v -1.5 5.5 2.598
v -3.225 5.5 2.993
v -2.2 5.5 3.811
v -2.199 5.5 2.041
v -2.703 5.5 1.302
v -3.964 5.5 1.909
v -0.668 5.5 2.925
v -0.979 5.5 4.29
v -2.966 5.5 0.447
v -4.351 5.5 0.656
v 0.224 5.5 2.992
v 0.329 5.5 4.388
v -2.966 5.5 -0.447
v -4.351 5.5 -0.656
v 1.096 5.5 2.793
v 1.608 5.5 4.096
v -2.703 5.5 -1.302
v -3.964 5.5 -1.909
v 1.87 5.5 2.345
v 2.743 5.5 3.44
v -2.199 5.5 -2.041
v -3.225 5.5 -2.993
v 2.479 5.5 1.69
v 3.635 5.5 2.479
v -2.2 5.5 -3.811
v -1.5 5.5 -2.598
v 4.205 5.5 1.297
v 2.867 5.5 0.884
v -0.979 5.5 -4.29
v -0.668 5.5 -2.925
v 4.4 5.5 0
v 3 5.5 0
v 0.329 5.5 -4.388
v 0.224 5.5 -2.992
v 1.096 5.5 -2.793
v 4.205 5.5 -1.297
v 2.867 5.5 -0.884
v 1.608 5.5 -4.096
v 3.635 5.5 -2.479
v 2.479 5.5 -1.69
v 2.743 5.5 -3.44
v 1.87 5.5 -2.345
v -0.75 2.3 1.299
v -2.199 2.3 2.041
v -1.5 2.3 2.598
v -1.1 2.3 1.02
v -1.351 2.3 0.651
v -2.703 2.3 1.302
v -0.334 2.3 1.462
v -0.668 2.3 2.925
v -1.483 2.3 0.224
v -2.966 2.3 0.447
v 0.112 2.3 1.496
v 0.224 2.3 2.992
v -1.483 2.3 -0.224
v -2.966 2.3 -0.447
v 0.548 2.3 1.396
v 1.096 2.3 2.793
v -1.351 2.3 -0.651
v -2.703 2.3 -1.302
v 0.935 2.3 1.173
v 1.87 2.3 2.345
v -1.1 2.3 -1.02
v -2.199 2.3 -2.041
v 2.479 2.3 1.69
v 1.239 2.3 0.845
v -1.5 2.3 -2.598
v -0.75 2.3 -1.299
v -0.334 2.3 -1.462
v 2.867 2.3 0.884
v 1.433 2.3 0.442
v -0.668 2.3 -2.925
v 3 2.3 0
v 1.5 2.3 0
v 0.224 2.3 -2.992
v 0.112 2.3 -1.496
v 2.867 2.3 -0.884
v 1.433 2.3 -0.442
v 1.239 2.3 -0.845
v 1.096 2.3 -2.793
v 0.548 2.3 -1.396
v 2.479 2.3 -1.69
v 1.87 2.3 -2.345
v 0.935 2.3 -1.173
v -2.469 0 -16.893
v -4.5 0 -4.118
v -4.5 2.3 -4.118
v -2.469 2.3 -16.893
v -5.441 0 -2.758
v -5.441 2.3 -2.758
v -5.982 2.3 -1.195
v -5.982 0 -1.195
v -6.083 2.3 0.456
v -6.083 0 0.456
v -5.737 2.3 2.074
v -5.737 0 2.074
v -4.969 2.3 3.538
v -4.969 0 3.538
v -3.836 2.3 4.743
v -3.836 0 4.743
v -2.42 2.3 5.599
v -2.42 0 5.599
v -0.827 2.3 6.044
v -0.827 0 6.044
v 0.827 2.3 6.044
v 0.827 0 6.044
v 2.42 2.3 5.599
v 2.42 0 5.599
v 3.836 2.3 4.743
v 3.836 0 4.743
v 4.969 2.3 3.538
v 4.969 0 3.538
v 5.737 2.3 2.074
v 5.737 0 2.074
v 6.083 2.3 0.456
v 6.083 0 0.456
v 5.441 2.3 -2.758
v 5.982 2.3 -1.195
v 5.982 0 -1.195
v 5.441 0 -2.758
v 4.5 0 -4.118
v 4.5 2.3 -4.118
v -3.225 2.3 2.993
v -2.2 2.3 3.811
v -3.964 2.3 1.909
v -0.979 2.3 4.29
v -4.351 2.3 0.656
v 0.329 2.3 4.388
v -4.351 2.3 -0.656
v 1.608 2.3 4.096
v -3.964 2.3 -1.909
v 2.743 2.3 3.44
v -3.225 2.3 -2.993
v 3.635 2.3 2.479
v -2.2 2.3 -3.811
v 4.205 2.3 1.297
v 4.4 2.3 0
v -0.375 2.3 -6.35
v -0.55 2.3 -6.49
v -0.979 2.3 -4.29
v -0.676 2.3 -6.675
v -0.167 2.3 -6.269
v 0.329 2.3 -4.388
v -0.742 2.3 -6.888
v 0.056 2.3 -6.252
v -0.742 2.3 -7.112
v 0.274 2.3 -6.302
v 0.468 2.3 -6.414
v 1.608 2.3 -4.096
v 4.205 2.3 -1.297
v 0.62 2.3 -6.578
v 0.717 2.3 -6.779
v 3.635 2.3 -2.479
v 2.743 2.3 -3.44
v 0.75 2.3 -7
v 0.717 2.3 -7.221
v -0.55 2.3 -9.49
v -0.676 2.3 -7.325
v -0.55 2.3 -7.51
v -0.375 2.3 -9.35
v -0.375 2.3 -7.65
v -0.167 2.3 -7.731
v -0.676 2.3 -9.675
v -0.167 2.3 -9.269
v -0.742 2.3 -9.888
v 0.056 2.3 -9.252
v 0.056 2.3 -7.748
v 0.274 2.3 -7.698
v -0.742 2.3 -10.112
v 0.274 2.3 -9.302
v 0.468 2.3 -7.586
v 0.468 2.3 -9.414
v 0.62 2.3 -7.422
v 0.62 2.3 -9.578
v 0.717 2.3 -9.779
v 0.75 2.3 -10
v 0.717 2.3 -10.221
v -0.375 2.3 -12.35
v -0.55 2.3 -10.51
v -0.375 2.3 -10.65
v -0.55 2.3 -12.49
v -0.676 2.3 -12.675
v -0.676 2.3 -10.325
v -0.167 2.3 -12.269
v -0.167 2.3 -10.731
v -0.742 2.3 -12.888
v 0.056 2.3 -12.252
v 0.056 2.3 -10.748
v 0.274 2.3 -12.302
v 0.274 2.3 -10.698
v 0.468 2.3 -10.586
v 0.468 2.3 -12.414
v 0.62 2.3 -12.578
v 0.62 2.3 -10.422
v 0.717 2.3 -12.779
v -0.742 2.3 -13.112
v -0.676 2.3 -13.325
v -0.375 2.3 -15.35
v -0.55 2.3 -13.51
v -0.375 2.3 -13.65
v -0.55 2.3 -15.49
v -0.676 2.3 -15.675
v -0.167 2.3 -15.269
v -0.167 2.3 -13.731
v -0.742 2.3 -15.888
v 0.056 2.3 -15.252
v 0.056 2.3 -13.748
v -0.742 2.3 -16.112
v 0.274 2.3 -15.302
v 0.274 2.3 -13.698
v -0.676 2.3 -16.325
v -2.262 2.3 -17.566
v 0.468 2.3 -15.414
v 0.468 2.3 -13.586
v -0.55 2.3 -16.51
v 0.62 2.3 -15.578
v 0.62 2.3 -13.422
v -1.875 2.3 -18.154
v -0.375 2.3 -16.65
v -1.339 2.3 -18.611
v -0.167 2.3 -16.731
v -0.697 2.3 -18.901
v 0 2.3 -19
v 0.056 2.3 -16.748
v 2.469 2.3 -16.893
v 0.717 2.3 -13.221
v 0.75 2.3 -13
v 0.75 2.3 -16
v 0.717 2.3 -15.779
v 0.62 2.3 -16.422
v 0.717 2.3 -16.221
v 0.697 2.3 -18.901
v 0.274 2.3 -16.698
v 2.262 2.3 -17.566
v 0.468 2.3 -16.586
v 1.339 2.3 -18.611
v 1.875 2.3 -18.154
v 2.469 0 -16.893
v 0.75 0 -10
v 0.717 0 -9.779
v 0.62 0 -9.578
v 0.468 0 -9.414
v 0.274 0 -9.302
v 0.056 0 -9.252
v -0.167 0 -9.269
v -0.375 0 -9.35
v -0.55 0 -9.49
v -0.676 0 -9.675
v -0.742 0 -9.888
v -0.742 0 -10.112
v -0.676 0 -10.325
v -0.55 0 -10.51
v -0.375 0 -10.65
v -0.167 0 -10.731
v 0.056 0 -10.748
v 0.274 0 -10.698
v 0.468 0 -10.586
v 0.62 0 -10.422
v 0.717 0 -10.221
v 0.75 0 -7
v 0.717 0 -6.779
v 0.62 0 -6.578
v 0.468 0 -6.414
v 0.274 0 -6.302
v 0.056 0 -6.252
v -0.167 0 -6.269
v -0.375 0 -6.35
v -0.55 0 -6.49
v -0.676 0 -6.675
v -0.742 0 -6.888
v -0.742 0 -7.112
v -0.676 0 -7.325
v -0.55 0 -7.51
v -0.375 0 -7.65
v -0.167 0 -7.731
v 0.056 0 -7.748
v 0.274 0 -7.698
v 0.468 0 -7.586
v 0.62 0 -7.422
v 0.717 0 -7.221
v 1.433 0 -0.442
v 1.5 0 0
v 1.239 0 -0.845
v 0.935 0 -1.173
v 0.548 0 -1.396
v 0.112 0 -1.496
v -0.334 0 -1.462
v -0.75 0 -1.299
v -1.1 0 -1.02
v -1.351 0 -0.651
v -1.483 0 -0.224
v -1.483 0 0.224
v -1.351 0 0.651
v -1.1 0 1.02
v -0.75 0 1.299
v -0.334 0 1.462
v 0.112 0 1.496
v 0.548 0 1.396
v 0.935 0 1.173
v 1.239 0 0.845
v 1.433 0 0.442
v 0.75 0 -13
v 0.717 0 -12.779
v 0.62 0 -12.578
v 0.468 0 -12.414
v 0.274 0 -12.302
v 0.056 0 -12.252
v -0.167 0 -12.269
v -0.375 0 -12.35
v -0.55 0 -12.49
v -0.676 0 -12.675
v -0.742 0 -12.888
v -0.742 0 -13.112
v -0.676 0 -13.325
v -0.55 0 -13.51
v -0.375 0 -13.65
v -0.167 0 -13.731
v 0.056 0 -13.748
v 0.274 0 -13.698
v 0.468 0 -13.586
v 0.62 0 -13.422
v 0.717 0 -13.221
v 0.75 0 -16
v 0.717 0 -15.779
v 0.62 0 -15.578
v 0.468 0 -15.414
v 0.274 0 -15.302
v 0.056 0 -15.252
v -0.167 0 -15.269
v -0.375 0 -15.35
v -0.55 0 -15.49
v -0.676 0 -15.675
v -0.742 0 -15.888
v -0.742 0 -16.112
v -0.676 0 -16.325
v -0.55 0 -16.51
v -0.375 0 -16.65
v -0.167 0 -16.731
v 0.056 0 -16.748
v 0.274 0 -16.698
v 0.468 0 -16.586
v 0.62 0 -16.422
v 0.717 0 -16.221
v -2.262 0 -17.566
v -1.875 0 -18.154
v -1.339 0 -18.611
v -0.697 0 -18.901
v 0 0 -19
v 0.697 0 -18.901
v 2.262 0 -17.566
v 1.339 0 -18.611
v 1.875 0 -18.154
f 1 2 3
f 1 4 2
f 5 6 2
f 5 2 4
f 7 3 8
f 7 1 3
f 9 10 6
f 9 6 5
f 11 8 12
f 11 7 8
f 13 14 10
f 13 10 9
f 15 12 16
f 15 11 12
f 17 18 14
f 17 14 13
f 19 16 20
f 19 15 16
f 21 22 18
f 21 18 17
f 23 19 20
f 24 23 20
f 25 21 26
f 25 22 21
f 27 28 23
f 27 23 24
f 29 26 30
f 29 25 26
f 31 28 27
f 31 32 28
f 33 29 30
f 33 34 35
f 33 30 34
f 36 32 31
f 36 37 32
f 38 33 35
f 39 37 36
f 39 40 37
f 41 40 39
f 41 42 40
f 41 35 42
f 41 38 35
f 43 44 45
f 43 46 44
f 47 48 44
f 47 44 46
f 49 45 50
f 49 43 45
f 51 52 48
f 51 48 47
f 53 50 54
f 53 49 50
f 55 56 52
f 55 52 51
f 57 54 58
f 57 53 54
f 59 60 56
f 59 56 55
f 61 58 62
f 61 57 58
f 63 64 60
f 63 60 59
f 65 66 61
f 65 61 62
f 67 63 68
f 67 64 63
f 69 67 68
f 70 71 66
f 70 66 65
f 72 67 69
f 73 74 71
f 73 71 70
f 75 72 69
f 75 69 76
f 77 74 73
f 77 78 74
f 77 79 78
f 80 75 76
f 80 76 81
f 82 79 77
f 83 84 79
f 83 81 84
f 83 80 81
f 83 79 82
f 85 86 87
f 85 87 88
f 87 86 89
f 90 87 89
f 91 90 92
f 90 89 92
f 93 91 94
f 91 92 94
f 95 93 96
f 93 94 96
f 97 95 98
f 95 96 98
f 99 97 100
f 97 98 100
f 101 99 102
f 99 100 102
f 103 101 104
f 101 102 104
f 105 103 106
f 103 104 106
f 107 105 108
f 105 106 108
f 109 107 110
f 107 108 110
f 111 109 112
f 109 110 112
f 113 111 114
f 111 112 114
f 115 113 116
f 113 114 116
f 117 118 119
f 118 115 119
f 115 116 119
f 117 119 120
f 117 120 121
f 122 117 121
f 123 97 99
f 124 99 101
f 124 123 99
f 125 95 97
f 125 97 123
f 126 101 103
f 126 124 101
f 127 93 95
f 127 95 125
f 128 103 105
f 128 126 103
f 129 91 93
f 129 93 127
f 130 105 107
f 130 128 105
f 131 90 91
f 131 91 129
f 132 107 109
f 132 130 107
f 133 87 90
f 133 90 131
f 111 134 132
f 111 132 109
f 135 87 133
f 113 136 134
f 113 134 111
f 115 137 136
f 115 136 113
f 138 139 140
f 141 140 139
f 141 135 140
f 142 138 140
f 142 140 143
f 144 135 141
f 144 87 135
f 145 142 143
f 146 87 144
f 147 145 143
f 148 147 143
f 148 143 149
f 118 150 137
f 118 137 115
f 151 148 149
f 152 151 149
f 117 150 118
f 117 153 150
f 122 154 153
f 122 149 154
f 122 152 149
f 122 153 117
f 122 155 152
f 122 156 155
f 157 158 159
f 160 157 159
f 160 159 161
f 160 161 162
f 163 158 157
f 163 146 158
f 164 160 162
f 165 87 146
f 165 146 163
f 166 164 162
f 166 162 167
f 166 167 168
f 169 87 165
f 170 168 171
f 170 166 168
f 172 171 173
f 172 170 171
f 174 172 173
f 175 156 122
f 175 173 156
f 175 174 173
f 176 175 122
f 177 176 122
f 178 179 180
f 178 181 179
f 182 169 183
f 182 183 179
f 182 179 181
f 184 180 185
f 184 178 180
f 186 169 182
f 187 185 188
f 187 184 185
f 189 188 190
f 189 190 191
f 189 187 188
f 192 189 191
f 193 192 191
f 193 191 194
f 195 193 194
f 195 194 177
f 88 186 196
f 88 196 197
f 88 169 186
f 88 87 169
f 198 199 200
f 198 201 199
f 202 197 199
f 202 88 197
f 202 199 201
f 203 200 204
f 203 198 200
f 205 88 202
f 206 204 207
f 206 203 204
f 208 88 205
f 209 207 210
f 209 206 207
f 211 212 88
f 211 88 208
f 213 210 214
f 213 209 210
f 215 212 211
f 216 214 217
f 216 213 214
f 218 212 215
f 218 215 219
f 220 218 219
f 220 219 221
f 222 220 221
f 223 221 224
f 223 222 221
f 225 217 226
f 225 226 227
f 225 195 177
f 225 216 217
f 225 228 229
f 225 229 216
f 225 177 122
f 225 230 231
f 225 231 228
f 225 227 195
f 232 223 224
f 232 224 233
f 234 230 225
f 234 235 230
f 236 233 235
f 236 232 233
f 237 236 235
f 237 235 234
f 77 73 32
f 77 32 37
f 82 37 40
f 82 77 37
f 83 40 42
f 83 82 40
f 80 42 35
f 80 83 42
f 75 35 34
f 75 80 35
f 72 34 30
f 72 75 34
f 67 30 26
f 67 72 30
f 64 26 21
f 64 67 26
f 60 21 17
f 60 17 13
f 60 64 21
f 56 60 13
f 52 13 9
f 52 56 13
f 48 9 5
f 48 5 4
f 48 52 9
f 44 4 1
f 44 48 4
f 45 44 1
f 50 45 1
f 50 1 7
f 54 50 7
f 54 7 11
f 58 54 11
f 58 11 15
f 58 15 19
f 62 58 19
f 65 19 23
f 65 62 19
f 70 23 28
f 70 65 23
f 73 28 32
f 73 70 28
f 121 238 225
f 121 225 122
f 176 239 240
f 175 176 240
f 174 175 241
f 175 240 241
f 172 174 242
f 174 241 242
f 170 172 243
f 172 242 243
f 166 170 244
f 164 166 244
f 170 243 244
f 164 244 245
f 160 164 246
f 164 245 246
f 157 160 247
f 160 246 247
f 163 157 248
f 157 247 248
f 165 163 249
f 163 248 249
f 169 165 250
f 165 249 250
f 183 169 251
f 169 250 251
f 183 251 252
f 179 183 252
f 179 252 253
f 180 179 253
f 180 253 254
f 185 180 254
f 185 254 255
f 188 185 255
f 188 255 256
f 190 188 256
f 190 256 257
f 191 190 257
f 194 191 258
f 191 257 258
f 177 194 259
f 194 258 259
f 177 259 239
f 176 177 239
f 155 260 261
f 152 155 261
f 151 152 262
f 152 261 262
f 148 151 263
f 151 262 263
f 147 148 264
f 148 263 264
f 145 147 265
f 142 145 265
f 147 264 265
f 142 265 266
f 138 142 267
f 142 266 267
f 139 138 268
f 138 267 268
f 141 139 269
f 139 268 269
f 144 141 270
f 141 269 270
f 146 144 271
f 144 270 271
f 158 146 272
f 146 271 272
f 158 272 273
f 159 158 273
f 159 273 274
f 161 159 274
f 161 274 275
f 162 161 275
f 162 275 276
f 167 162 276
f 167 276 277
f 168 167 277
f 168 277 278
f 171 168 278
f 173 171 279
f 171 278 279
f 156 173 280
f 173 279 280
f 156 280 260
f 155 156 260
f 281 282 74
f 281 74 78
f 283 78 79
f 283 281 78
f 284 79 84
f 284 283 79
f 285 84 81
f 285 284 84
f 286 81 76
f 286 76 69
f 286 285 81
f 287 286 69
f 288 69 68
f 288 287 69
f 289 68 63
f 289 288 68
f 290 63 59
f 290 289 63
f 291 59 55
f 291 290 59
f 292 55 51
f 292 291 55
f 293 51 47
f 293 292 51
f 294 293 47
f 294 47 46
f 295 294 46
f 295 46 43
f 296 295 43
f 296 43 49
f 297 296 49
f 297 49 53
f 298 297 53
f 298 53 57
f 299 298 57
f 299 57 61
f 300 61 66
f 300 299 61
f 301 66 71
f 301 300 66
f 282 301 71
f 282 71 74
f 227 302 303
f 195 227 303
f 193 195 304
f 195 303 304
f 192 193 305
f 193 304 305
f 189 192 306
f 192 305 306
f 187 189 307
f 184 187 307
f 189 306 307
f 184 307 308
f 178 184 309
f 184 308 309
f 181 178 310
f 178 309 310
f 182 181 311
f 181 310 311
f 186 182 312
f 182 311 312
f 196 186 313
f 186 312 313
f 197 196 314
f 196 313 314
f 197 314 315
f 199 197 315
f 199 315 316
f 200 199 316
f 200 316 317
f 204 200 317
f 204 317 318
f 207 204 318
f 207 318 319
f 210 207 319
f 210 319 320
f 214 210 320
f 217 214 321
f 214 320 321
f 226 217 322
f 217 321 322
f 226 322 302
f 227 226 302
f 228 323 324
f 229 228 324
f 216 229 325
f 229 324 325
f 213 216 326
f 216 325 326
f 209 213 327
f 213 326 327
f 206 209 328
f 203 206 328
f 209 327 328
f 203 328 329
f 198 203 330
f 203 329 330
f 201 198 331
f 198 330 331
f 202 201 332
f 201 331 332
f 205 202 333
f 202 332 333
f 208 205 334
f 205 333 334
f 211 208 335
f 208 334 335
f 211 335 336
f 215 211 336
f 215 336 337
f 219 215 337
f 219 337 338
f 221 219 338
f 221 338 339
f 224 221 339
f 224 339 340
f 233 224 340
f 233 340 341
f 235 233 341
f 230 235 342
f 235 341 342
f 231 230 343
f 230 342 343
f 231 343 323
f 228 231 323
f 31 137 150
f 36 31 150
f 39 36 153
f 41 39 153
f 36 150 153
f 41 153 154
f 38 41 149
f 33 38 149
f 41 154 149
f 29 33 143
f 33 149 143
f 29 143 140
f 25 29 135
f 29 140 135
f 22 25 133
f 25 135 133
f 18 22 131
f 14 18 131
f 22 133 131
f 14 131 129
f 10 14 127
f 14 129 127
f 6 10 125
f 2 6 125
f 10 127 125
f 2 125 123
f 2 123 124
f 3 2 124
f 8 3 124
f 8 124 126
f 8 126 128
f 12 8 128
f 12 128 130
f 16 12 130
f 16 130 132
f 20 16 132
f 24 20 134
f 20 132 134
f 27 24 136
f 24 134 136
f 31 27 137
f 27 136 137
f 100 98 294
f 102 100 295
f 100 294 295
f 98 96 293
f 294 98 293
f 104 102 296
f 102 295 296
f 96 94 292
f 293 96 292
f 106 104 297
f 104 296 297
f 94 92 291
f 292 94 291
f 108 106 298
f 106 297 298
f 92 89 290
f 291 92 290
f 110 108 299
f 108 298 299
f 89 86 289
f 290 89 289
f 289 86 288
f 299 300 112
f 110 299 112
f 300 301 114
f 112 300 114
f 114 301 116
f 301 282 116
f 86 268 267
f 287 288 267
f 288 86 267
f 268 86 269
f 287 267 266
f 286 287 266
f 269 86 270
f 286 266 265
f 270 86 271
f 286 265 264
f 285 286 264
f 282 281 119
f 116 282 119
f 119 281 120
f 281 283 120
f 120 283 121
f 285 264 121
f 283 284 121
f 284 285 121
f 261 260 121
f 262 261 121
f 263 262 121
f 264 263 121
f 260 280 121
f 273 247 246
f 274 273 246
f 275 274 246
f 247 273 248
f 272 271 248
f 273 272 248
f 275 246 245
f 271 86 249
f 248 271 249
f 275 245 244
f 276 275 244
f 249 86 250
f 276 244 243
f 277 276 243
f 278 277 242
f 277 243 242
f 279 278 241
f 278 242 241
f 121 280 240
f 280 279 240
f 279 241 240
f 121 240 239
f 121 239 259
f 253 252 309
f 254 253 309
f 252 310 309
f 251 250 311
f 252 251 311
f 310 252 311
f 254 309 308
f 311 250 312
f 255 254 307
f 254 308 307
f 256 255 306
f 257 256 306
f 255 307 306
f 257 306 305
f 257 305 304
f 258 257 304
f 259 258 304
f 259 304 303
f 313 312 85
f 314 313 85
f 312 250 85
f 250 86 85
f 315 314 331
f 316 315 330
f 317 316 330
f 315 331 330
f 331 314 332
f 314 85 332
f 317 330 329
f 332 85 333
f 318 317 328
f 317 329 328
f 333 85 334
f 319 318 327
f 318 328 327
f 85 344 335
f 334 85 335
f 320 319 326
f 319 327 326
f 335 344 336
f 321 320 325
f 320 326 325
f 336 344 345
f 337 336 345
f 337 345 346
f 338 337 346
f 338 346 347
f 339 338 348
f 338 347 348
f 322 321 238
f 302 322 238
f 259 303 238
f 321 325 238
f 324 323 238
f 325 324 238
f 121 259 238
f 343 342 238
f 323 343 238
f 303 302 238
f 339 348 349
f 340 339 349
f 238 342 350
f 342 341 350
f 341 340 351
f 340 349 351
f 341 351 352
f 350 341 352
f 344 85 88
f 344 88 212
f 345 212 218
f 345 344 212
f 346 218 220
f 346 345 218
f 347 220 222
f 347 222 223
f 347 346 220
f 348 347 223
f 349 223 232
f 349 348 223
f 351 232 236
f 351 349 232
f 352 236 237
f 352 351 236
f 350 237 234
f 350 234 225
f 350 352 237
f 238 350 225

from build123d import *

# Parameters (mm, degrees)
SKETCH1_R           = 6.1
SKETCH1_R_2         = 1.5
BOSS_EXTRUDE1_DEPTH = 2.3
SKETCH2_R           = 4.4
SKETCH2_R_2         = 3
BOSS_EXTRUDE2_DEPTH = 3.2
SKETCH3_R           = 0.75
BOSS_EXTRUDE3_DEPTH = 2.3


with BuildPart() as part:
    # Sketch1 → Boss-Extrude1 (new body)
    with BuildSketch(Plane(origin=(0, 0, 0), x_dir=(1, 0, 0), z_dir=(0, 1, 0))):
        Circle(SKETCH1_R)
        Circle(SKETCH1_R_2, mode=Mode.SUBTRACT)
    extrude(amount=BOSS_EXTRUDE1_DEPTH)

    # Sketch2 → Boss-Extrude2 (add)
    with BuildSketch(Plane(origin=(0, 2.3, 0), x_dir=(1, 0, 0), z_dir=(0, 1, 0))):
        Circle(SKETCH2_R)
        Circle(SKETCH2_R_2, mode=Mode.SUBTRACT)
    extrude(amount=BOSS_EXTRUDE2_DEPTH)

    # Sketch3 → Boss-Extrude3 (add)
    with BuildSketch(Plane.XZ):
        with BuildLine():
            Line((-4.5, -4.118252056), (-2.468988638, -16.892549493))
            ThreePointArc((-2.468988638, -16.892549493), (0, -19), (2.468988638, -16.892549493))
            Line((2.468988638, -16.892549493), (4.5, -4.118252056))
            ThreePointArc((4.5, -4.118252056), (0, -6.1), (-4.5, -4.118252056))
        make_face()
        with Locations((0, -16)):
            Circle(SKETCH3_R, mode=Mode.SUBTRACT)
        with Locations((0, -13)):
            Circle(SKETCH3_R, mode=Mode.SUBTRACT)
        with Locations((0, -10)):
            Circle(SKETCH3_R, mode=Mode.SUBTRACT)
        with Locations((0, -7)):
            Circle(SKETCH3_R, mode=Mode.SUBTRACT)
    extrude(amount=-BOSS_EXTRUDE3_DEPTH)


solid = part.part
